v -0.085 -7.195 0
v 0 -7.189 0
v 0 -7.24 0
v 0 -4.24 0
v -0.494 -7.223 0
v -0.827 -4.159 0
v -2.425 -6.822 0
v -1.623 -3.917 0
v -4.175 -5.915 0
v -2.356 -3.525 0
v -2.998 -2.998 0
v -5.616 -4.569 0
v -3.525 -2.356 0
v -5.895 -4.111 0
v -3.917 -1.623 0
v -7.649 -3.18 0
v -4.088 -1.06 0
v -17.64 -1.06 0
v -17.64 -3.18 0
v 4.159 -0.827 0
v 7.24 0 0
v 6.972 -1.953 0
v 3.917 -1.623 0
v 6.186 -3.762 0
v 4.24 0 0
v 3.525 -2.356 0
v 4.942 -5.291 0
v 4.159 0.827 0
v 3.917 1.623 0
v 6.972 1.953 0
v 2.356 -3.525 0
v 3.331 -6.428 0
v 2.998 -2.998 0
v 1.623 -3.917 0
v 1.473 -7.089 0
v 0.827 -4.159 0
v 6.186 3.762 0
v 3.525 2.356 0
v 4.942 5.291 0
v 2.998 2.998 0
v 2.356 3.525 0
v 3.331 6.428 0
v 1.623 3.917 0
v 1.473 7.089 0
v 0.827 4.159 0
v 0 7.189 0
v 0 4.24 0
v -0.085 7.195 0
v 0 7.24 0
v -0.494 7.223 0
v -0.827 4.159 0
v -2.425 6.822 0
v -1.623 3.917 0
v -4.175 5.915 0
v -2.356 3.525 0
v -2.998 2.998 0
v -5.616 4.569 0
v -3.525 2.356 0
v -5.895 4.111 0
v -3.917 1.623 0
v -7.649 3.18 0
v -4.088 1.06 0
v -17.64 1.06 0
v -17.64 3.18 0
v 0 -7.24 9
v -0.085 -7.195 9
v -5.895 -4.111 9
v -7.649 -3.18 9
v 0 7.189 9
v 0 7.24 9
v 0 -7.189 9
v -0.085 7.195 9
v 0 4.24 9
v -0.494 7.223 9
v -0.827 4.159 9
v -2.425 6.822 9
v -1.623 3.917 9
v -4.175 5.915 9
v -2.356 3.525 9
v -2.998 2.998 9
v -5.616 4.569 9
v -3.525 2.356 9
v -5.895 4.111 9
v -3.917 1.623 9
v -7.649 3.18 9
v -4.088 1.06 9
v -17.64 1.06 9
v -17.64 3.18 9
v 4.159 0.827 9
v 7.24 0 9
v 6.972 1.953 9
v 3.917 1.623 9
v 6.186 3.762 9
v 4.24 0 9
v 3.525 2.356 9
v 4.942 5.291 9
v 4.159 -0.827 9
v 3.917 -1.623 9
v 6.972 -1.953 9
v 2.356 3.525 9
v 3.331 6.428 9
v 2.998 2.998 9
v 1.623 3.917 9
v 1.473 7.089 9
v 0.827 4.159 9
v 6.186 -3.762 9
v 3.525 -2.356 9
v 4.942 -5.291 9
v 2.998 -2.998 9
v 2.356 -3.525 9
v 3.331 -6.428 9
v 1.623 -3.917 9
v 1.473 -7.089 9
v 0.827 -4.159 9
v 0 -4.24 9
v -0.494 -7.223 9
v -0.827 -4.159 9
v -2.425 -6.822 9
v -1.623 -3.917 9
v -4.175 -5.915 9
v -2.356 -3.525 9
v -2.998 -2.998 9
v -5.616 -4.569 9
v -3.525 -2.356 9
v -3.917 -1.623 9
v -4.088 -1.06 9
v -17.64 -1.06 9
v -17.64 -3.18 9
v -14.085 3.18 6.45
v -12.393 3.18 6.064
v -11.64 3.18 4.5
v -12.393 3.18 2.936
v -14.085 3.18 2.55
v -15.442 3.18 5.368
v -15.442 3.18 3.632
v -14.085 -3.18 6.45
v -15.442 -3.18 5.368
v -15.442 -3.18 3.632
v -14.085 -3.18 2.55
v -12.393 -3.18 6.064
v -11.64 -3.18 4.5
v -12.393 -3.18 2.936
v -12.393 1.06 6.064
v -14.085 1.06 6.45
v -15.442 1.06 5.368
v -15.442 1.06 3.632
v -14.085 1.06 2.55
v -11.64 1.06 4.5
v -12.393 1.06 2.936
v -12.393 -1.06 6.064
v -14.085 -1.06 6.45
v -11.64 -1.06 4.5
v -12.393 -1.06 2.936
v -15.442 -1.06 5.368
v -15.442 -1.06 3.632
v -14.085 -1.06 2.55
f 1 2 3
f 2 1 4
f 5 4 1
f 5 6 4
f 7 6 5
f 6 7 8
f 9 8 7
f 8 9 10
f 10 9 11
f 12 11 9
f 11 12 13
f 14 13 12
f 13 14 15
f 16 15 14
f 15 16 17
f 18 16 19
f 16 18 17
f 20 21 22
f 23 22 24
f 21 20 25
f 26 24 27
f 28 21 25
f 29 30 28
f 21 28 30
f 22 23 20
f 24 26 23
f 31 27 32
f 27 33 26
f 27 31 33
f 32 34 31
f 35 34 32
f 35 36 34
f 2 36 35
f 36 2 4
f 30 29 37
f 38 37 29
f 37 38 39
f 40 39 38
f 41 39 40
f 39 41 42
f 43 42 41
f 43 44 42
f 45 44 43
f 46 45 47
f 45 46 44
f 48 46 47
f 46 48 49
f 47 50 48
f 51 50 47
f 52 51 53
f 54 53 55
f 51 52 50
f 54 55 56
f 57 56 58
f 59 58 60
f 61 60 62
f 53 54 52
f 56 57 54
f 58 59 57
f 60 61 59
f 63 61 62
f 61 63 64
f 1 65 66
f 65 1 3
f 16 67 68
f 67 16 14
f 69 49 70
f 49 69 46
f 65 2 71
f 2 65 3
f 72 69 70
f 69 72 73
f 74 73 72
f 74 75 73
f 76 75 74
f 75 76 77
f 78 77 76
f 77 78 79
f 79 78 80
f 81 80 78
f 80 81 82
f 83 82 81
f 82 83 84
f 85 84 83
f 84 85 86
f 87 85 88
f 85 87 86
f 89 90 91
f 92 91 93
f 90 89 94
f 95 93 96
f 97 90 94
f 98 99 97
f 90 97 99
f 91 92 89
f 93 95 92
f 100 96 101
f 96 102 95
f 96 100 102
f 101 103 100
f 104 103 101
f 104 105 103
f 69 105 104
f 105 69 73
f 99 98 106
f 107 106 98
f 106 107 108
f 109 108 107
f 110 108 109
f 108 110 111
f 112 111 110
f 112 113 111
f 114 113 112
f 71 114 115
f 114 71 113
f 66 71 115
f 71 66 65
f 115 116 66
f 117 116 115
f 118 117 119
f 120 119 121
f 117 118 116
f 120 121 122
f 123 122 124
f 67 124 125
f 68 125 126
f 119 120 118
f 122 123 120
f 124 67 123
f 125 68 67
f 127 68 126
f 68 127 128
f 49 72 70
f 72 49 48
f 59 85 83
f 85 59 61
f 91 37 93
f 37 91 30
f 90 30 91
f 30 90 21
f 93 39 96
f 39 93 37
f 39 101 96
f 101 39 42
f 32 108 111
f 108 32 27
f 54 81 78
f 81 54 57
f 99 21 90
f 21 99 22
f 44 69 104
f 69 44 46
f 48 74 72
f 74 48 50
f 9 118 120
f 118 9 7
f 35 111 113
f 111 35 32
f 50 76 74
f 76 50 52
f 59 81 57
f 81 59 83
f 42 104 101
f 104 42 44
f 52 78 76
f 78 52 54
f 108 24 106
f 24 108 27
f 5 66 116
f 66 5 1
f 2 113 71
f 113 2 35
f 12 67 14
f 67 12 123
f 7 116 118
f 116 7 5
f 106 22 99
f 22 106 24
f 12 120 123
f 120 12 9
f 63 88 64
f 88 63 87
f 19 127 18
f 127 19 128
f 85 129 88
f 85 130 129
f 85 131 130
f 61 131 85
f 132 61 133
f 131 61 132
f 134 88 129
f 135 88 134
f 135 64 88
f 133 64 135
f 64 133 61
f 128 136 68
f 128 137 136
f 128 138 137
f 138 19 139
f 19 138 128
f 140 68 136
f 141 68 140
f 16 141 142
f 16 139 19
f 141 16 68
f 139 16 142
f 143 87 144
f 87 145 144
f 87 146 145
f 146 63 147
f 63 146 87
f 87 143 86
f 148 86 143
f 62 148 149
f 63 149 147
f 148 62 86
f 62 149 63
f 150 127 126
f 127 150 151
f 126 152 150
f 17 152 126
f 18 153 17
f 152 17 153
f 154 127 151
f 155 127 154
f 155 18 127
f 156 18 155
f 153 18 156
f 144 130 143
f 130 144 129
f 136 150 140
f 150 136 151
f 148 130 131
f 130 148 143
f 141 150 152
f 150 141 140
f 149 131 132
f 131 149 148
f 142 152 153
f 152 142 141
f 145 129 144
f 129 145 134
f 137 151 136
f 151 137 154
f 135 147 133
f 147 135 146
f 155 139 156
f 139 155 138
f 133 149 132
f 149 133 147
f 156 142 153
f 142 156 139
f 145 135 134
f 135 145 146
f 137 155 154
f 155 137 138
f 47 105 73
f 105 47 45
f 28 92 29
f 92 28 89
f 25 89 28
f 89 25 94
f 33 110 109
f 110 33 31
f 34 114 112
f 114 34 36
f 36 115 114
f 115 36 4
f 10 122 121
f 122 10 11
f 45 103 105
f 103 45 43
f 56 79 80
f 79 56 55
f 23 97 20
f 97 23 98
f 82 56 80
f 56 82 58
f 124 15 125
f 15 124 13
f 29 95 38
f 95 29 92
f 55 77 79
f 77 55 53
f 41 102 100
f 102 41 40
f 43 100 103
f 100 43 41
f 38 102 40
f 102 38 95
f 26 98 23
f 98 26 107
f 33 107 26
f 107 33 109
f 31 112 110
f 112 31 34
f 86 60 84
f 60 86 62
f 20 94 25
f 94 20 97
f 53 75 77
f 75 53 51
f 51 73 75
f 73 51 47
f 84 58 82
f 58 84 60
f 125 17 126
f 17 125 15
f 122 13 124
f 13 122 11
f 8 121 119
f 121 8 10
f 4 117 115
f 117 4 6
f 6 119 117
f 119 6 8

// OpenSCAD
//CUSTOMIZER VARIABLES

/* [Basic_Parameters] */

// larger or smaller will need a bit of additional design work
// Rod diameter, in mm
rod_diameter = 8.0; // [2.0:0.1:50]

// Bolt diameter, in mm
bolt_diameter = 3.0;    // [2:0.1:20]

// margin along the rod, in mm
depth_margin = 3;   // [2:30]

// margin around the rod, in mm
rod_margin = 3;   // [2:30]

// this saves material, but increases stress, requires supports for FDM printing
// Make the clamp arms smaller - won't print FDM, boolean
small_arms = 0;   // [0:false, 1:true]

//CUSTOMIZER VARIABLES END


// Sanity checks
if( rod_diameter<=0
    || bolt_diameter <= 0 )
{
    echo("<B>Error: Missing important parameters</B>");
}


max_gap_thickness = 6;  // don't let the arms get too thick

// z depth
main_depth= max(3, bolt_diameter) + depth_margin*2;

// our object, translated to be flat on xy plane for easy STL generation
translate([0,0,main_depth/2])
    optics_clamp();

module optics_clamp(){

    bolt_rad= (bolt_diameter+1)/2;  // this should be sorta loose
    rod_rad= (rod_diameter * 1.06)/2;  // don't increment this one as much - it needs to be a tight fit
    holder_rad = rod_rad + rod_margin;

    main_height= rod_diameter+rod_margin;
    
    rod_x = 0;

    rod_clamp_depth_without= bolt_diameter+rod_margin;
    rod_clamp_depth_with= max( bolt_diameter+rod_margin, main_depth);
    rod_clamp_depth= (small_arms == 0) ? rod_clamp_depth_with : rod_clamp_depth_without;

    rod_clamp_space= min( max_gap_thickness, max(1, rod_rad / 2 ) );
    rod_clamp_length= min( 10, max( 7, rod_rad ) ) + max( bolt_diameter, rod_margin ) + rod_margin;
    rod_clamp_thickness= min( rod_clamp_space+2*max_gap_thickness, max( rod_clamp_space + 3, rod_rad * 1.5 ) );
    rod_clamp_x= rod_x - rod_rad - (rod_clamp_length/2) + 0.1;  // fudge for small rods

    rod_nut_x= rod_clamp_x - (rod_clamp_length/2) + (rod_margin/2) + bolt_rad;

    rod_length= main_depth + 20;

    difference() {

        union() {

          // diode holder
          translate([rod_x,0,-main_depth/2])
            cylinder(main_depth,holder_rad,holder_rad);

          if (small_arms == 0)  {
              // hacky fillet long
              translate([0,0,-main_depth/2])
                linear_extrude(main_depth)
                    polygon( [ [rod_x, -holder_rad], [rod_x, holder_rad], [rod_nut_x, 0] ] );
              // hacky fillet short
              translate([0,0,-main_depth/2])
                linear_extrude(main_depth)
                    polygon( [ [rod_x, -main_height/2], [rod_x, main_height/2], [(rod_x+rod_nut_x)/2, 0] ] );
          }

          // diode clamp arms
         translate([rod_clamp_x,0,0])
             cube([rod_clamp_length+1,rod_clamp_thickness,rod_clamp_depth],center = true);
        }

    // diode clamp gap
      translate([rod_clamp_x,0,0])
        cube([rod_clamp_length+2,rod_clamp_space,main_depth+5],center = true);

    // diode clamp bolt hole
   translate([rod_nut_x,10,0])
      rotate([90,0,0])
        cylinder(20,bolt_rad,bolt_rad);

    // the rod
    #color("magenta")
      translate([rod_x,0,-rod_length/2])
        rotate([0,0,0])
          cylinder(rod_length,rod_rad,rod_rad,$fn=32);    // needs to be fairly smooth
    }
}
